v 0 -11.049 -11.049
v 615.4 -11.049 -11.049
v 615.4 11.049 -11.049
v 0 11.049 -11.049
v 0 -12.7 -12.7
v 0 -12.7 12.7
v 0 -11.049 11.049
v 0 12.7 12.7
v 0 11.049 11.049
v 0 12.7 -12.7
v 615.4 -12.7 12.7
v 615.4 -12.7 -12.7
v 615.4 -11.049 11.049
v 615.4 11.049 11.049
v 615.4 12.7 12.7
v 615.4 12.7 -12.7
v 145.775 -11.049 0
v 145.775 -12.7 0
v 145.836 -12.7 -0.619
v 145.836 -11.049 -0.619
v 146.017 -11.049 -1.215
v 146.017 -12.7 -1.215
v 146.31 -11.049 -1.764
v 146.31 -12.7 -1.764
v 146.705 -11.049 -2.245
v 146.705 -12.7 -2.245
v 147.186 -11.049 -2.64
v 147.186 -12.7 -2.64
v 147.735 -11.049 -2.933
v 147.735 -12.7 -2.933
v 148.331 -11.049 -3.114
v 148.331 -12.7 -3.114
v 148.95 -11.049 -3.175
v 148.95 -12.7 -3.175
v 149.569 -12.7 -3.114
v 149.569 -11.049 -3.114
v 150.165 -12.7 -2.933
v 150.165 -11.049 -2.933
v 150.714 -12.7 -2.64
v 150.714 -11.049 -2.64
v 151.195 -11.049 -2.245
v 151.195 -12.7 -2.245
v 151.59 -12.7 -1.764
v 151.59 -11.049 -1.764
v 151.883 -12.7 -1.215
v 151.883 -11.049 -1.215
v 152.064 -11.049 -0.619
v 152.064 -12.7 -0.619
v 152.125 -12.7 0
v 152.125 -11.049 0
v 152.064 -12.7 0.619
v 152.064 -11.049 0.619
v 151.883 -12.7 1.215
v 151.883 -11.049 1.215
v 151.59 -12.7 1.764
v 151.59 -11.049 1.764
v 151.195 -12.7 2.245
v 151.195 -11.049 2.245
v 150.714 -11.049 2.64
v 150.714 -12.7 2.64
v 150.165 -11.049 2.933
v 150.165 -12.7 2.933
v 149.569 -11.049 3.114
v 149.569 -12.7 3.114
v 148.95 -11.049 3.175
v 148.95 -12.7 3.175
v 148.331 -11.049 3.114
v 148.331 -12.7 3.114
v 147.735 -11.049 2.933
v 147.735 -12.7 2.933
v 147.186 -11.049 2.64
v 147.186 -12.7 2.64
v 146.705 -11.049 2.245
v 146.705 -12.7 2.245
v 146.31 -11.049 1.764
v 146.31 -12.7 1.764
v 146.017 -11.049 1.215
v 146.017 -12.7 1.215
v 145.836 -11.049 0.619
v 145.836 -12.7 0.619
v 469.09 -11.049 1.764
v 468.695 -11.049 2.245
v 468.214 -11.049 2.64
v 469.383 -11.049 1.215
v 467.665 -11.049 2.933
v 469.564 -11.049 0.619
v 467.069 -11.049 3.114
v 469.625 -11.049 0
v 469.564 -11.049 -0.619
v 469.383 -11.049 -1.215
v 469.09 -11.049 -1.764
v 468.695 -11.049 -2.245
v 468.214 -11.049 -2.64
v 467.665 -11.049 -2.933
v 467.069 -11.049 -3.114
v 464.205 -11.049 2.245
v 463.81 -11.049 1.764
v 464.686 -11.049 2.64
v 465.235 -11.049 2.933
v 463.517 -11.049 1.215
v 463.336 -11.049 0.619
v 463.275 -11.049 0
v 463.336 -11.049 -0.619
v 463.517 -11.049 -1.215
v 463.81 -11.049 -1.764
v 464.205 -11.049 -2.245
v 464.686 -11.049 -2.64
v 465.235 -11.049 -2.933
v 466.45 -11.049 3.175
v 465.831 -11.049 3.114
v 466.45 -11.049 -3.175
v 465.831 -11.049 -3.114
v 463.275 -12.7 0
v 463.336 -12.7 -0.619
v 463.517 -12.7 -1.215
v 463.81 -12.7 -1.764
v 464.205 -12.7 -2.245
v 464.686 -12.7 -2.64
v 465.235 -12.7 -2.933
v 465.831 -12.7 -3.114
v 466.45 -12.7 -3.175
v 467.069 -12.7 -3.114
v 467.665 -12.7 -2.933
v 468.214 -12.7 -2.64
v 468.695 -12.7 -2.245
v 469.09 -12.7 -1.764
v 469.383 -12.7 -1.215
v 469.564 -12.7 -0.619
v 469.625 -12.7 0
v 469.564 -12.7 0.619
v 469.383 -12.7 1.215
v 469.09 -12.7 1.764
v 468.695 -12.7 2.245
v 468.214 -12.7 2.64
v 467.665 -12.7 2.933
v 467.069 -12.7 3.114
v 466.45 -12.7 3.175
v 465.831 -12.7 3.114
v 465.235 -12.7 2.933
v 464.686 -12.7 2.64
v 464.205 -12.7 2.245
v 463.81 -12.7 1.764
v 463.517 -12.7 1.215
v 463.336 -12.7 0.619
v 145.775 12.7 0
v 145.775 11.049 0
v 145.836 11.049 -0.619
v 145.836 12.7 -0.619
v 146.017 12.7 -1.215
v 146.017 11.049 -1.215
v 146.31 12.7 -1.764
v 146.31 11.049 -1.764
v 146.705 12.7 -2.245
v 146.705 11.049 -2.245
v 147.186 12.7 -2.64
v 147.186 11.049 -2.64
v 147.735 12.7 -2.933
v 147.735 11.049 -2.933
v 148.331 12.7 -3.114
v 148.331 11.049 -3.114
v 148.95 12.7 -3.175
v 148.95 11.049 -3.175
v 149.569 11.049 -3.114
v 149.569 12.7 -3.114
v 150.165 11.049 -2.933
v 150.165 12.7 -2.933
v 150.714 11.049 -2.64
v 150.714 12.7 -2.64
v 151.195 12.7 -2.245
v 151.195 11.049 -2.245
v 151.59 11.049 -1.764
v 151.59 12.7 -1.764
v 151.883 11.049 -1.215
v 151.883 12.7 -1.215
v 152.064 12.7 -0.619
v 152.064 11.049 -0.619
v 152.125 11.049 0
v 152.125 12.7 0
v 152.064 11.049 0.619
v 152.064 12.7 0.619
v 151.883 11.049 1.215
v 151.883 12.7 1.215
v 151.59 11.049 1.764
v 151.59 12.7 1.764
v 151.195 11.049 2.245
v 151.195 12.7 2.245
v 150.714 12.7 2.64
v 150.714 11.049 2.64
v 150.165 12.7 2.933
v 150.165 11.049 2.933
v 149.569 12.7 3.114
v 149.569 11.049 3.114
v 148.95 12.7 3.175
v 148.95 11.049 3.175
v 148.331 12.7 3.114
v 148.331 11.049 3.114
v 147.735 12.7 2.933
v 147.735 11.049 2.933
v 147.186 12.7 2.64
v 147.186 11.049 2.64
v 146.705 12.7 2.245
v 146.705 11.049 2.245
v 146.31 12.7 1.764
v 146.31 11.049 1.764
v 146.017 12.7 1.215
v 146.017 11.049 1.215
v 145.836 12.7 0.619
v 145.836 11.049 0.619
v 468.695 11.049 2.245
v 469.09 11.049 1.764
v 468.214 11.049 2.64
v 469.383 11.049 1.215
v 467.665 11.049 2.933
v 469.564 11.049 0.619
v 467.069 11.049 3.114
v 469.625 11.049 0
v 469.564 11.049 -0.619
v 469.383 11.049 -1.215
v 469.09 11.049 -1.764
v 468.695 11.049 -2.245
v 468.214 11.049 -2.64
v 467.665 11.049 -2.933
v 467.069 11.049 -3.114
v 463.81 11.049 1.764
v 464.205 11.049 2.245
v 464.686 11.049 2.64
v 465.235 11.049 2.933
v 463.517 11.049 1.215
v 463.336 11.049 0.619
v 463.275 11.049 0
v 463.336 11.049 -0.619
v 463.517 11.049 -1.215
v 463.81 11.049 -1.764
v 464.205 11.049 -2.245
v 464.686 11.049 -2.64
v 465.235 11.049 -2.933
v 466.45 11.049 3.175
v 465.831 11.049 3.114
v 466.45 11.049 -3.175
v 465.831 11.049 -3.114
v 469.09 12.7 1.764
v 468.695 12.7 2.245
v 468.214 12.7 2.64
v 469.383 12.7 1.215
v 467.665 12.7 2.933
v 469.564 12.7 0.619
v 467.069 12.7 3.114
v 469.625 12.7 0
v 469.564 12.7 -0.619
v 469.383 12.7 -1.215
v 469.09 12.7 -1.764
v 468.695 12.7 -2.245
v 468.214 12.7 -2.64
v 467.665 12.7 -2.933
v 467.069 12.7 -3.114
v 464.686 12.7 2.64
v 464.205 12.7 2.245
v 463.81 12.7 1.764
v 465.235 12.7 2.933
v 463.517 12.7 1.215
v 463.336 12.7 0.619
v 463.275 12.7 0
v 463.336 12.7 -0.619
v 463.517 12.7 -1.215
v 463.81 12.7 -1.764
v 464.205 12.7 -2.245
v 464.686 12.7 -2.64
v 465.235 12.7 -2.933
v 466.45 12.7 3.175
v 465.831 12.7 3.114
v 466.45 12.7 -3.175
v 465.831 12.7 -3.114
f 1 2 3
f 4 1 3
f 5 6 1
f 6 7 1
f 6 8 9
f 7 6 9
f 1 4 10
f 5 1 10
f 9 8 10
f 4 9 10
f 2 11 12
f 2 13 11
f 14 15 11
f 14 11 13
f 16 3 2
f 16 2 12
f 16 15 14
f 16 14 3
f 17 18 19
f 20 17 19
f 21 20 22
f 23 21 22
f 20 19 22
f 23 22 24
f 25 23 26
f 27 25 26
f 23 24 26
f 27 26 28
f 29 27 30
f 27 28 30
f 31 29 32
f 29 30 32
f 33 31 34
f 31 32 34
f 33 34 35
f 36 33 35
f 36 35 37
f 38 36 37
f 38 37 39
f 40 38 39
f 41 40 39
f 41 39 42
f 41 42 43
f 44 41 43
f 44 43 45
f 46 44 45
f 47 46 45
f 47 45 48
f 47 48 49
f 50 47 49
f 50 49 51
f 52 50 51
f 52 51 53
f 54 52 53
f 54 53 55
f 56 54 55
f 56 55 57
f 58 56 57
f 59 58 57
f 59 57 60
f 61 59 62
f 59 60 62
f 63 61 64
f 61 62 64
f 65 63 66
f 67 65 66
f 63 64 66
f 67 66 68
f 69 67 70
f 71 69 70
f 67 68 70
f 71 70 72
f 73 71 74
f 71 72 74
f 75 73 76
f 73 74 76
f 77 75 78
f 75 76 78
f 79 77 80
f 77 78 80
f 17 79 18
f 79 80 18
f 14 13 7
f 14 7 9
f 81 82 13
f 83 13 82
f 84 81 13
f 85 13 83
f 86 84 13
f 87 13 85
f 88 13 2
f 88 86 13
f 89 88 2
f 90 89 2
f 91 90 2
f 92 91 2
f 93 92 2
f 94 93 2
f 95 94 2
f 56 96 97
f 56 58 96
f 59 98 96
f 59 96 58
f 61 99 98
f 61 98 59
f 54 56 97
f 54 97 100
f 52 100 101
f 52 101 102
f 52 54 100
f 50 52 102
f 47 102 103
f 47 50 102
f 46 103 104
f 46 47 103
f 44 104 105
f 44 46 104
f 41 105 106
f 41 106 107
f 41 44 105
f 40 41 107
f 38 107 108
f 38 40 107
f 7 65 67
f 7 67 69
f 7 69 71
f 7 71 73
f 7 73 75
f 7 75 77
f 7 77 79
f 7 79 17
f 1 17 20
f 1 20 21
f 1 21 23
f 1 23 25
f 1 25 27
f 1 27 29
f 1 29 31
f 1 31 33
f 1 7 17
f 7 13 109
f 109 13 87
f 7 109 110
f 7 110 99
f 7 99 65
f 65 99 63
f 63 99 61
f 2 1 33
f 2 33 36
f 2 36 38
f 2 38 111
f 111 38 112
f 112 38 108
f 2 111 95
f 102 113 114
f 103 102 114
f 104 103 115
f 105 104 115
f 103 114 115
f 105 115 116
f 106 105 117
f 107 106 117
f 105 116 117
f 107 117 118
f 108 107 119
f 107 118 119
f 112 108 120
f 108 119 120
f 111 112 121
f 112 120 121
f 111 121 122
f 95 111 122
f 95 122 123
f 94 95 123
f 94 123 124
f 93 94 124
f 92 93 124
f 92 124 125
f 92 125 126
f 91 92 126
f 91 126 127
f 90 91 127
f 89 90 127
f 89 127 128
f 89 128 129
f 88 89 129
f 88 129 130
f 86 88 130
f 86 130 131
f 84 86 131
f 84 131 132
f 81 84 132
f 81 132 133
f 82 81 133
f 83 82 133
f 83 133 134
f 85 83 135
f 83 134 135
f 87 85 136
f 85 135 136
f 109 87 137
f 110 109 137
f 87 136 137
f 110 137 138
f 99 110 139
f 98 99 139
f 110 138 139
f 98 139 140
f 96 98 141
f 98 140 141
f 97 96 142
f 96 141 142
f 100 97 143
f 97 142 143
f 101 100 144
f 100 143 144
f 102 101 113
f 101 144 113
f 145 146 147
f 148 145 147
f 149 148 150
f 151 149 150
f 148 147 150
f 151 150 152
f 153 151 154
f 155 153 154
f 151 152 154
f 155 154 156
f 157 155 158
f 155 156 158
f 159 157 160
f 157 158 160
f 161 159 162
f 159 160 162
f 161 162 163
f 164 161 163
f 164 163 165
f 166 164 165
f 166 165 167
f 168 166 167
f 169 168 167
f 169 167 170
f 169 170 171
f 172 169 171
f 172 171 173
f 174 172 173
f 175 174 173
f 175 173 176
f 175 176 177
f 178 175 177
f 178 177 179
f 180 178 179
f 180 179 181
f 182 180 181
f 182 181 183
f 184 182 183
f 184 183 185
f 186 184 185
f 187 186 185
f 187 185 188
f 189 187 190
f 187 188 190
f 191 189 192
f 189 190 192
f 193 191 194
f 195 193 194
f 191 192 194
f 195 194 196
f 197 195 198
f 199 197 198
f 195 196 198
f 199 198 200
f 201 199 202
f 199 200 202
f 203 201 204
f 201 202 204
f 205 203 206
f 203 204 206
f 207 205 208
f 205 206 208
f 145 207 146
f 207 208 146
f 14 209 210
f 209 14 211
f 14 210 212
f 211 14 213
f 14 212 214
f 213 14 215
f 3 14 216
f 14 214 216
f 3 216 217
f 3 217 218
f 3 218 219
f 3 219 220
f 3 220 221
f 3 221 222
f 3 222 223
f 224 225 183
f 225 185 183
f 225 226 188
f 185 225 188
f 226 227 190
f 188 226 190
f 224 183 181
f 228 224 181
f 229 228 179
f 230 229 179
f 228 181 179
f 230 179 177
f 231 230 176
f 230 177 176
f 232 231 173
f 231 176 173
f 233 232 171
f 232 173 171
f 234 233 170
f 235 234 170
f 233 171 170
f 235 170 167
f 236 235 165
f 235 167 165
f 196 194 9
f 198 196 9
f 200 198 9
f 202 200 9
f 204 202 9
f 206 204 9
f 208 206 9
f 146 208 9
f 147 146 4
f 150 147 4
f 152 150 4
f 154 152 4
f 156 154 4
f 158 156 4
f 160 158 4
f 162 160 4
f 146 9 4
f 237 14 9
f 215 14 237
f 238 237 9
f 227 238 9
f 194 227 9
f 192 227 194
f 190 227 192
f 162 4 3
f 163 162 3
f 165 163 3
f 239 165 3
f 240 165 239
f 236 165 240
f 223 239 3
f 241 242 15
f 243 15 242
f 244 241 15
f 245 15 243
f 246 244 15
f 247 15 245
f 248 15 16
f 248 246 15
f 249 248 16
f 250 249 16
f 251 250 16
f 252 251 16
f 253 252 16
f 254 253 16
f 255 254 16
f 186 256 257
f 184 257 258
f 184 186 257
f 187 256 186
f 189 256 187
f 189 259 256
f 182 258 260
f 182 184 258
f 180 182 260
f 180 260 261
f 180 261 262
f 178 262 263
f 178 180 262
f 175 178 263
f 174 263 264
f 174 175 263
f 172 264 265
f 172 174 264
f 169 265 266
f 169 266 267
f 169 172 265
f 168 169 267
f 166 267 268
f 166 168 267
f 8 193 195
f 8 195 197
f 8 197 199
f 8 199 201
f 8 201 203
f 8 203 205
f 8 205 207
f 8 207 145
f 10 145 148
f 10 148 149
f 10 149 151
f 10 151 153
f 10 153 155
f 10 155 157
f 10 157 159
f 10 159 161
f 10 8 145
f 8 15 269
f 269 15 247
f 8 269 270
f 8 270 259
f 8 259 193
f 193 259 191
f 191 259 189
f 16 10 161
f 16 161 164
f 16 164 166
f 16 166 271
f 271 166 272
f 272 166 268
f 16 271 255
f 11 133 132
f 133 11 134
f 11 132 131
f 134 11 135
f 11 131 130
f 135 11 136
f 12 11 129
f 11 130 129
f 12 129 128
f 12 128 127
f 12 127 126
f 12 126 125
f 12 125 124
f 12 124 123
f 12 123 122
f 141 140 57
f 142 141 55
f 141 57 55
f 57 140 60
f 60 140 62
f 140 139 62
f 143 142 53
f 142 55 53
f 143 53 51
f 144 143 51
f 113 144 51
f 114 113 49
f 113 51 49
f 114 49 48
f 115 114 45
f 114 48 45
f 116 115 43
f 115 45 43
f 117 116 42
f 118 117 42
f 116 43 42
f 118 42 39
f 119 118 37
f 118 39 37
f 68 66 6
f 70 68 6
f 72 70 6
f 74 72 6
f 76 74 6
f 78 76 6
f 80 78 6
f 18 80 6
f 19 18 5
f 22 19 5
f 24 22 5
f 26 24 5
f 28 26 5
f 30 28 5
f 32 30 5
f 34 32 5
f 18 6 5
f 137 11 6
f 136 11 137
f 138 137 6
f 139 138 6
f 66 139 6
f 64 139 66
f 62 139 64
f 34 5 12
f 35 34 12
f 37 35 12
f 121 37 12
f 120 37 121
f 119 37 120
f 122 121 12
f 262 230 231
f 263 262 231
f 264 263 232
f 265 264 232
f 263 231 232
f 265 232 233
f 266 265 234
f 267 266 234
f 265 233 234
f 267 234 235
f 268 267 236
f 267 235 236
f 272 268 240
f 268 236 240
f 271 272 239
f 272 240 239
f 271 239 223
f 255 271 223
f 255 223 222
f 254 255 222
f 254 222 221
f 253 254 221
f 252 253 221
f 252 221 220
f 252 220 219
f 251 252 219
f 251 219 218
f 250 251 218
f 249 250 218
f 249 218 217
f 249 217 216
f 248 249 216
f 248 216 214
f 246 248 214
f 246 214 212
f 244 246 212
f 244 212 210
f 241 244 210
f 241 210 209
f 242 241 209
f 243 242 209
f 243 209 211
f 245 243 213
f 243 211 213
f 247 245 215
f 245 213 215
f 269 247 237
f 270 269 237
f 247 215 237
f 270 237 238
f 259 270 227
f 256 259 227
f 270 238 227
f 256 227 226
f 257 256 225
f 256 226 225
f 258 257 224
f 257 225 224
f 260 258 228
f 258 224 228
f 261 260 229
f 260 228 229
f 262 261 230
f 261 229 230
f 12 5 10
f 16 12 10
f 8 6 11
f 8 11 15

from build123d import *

# Parameters (mm, degrees)
SKETCH16_W                                     = 25.4
SKETCH16_H                                     = 25.4
SKETCH16_W_2                                   = 22.098
SKETCH16_H_2                                   = 22.098
AL_TUBE_SQUARE_AL_TUBE_1_SQR_X_0_065_WAL_DEPTH = 615.4
F_1_4_0_25_DIAMETER_HOLE1_D                    = 6.35


with BuildPart() as part:
    # Sketch16 → Al tube square AL TUBE 1 SQR X 0.065 WALL(1) (new body)
    with BuildSketch(Plane(origin=(0, 0, 0), x_dir=(0, 0, -1), z_dir=(1, 0, 0))):
        Rectangle(SKETCH16_W, SKETCH16_H)
        Rectangle(SKETCH16_W_2, SKETCH16_H_2, mode=Mode.SUBTRACT)
    extrude(amount=AL_TUBE_SQUARE_AL_TUBE_1_SQR_X_0_065_WAL_DEPTH)

    # 1/4 (0.25) Diameter Hole1 (through all)
    with Locations(Plane(origin=(0, 12.7, 0), x_dir=(1, 0, 0), z_dir=(0, 1, 0))):
        with Locations((466.45, 0), (148.95, 0)):
            Hole(F_1_4_0_25_DIAMETER_HOLE1_D / 2)


solid = part.part
